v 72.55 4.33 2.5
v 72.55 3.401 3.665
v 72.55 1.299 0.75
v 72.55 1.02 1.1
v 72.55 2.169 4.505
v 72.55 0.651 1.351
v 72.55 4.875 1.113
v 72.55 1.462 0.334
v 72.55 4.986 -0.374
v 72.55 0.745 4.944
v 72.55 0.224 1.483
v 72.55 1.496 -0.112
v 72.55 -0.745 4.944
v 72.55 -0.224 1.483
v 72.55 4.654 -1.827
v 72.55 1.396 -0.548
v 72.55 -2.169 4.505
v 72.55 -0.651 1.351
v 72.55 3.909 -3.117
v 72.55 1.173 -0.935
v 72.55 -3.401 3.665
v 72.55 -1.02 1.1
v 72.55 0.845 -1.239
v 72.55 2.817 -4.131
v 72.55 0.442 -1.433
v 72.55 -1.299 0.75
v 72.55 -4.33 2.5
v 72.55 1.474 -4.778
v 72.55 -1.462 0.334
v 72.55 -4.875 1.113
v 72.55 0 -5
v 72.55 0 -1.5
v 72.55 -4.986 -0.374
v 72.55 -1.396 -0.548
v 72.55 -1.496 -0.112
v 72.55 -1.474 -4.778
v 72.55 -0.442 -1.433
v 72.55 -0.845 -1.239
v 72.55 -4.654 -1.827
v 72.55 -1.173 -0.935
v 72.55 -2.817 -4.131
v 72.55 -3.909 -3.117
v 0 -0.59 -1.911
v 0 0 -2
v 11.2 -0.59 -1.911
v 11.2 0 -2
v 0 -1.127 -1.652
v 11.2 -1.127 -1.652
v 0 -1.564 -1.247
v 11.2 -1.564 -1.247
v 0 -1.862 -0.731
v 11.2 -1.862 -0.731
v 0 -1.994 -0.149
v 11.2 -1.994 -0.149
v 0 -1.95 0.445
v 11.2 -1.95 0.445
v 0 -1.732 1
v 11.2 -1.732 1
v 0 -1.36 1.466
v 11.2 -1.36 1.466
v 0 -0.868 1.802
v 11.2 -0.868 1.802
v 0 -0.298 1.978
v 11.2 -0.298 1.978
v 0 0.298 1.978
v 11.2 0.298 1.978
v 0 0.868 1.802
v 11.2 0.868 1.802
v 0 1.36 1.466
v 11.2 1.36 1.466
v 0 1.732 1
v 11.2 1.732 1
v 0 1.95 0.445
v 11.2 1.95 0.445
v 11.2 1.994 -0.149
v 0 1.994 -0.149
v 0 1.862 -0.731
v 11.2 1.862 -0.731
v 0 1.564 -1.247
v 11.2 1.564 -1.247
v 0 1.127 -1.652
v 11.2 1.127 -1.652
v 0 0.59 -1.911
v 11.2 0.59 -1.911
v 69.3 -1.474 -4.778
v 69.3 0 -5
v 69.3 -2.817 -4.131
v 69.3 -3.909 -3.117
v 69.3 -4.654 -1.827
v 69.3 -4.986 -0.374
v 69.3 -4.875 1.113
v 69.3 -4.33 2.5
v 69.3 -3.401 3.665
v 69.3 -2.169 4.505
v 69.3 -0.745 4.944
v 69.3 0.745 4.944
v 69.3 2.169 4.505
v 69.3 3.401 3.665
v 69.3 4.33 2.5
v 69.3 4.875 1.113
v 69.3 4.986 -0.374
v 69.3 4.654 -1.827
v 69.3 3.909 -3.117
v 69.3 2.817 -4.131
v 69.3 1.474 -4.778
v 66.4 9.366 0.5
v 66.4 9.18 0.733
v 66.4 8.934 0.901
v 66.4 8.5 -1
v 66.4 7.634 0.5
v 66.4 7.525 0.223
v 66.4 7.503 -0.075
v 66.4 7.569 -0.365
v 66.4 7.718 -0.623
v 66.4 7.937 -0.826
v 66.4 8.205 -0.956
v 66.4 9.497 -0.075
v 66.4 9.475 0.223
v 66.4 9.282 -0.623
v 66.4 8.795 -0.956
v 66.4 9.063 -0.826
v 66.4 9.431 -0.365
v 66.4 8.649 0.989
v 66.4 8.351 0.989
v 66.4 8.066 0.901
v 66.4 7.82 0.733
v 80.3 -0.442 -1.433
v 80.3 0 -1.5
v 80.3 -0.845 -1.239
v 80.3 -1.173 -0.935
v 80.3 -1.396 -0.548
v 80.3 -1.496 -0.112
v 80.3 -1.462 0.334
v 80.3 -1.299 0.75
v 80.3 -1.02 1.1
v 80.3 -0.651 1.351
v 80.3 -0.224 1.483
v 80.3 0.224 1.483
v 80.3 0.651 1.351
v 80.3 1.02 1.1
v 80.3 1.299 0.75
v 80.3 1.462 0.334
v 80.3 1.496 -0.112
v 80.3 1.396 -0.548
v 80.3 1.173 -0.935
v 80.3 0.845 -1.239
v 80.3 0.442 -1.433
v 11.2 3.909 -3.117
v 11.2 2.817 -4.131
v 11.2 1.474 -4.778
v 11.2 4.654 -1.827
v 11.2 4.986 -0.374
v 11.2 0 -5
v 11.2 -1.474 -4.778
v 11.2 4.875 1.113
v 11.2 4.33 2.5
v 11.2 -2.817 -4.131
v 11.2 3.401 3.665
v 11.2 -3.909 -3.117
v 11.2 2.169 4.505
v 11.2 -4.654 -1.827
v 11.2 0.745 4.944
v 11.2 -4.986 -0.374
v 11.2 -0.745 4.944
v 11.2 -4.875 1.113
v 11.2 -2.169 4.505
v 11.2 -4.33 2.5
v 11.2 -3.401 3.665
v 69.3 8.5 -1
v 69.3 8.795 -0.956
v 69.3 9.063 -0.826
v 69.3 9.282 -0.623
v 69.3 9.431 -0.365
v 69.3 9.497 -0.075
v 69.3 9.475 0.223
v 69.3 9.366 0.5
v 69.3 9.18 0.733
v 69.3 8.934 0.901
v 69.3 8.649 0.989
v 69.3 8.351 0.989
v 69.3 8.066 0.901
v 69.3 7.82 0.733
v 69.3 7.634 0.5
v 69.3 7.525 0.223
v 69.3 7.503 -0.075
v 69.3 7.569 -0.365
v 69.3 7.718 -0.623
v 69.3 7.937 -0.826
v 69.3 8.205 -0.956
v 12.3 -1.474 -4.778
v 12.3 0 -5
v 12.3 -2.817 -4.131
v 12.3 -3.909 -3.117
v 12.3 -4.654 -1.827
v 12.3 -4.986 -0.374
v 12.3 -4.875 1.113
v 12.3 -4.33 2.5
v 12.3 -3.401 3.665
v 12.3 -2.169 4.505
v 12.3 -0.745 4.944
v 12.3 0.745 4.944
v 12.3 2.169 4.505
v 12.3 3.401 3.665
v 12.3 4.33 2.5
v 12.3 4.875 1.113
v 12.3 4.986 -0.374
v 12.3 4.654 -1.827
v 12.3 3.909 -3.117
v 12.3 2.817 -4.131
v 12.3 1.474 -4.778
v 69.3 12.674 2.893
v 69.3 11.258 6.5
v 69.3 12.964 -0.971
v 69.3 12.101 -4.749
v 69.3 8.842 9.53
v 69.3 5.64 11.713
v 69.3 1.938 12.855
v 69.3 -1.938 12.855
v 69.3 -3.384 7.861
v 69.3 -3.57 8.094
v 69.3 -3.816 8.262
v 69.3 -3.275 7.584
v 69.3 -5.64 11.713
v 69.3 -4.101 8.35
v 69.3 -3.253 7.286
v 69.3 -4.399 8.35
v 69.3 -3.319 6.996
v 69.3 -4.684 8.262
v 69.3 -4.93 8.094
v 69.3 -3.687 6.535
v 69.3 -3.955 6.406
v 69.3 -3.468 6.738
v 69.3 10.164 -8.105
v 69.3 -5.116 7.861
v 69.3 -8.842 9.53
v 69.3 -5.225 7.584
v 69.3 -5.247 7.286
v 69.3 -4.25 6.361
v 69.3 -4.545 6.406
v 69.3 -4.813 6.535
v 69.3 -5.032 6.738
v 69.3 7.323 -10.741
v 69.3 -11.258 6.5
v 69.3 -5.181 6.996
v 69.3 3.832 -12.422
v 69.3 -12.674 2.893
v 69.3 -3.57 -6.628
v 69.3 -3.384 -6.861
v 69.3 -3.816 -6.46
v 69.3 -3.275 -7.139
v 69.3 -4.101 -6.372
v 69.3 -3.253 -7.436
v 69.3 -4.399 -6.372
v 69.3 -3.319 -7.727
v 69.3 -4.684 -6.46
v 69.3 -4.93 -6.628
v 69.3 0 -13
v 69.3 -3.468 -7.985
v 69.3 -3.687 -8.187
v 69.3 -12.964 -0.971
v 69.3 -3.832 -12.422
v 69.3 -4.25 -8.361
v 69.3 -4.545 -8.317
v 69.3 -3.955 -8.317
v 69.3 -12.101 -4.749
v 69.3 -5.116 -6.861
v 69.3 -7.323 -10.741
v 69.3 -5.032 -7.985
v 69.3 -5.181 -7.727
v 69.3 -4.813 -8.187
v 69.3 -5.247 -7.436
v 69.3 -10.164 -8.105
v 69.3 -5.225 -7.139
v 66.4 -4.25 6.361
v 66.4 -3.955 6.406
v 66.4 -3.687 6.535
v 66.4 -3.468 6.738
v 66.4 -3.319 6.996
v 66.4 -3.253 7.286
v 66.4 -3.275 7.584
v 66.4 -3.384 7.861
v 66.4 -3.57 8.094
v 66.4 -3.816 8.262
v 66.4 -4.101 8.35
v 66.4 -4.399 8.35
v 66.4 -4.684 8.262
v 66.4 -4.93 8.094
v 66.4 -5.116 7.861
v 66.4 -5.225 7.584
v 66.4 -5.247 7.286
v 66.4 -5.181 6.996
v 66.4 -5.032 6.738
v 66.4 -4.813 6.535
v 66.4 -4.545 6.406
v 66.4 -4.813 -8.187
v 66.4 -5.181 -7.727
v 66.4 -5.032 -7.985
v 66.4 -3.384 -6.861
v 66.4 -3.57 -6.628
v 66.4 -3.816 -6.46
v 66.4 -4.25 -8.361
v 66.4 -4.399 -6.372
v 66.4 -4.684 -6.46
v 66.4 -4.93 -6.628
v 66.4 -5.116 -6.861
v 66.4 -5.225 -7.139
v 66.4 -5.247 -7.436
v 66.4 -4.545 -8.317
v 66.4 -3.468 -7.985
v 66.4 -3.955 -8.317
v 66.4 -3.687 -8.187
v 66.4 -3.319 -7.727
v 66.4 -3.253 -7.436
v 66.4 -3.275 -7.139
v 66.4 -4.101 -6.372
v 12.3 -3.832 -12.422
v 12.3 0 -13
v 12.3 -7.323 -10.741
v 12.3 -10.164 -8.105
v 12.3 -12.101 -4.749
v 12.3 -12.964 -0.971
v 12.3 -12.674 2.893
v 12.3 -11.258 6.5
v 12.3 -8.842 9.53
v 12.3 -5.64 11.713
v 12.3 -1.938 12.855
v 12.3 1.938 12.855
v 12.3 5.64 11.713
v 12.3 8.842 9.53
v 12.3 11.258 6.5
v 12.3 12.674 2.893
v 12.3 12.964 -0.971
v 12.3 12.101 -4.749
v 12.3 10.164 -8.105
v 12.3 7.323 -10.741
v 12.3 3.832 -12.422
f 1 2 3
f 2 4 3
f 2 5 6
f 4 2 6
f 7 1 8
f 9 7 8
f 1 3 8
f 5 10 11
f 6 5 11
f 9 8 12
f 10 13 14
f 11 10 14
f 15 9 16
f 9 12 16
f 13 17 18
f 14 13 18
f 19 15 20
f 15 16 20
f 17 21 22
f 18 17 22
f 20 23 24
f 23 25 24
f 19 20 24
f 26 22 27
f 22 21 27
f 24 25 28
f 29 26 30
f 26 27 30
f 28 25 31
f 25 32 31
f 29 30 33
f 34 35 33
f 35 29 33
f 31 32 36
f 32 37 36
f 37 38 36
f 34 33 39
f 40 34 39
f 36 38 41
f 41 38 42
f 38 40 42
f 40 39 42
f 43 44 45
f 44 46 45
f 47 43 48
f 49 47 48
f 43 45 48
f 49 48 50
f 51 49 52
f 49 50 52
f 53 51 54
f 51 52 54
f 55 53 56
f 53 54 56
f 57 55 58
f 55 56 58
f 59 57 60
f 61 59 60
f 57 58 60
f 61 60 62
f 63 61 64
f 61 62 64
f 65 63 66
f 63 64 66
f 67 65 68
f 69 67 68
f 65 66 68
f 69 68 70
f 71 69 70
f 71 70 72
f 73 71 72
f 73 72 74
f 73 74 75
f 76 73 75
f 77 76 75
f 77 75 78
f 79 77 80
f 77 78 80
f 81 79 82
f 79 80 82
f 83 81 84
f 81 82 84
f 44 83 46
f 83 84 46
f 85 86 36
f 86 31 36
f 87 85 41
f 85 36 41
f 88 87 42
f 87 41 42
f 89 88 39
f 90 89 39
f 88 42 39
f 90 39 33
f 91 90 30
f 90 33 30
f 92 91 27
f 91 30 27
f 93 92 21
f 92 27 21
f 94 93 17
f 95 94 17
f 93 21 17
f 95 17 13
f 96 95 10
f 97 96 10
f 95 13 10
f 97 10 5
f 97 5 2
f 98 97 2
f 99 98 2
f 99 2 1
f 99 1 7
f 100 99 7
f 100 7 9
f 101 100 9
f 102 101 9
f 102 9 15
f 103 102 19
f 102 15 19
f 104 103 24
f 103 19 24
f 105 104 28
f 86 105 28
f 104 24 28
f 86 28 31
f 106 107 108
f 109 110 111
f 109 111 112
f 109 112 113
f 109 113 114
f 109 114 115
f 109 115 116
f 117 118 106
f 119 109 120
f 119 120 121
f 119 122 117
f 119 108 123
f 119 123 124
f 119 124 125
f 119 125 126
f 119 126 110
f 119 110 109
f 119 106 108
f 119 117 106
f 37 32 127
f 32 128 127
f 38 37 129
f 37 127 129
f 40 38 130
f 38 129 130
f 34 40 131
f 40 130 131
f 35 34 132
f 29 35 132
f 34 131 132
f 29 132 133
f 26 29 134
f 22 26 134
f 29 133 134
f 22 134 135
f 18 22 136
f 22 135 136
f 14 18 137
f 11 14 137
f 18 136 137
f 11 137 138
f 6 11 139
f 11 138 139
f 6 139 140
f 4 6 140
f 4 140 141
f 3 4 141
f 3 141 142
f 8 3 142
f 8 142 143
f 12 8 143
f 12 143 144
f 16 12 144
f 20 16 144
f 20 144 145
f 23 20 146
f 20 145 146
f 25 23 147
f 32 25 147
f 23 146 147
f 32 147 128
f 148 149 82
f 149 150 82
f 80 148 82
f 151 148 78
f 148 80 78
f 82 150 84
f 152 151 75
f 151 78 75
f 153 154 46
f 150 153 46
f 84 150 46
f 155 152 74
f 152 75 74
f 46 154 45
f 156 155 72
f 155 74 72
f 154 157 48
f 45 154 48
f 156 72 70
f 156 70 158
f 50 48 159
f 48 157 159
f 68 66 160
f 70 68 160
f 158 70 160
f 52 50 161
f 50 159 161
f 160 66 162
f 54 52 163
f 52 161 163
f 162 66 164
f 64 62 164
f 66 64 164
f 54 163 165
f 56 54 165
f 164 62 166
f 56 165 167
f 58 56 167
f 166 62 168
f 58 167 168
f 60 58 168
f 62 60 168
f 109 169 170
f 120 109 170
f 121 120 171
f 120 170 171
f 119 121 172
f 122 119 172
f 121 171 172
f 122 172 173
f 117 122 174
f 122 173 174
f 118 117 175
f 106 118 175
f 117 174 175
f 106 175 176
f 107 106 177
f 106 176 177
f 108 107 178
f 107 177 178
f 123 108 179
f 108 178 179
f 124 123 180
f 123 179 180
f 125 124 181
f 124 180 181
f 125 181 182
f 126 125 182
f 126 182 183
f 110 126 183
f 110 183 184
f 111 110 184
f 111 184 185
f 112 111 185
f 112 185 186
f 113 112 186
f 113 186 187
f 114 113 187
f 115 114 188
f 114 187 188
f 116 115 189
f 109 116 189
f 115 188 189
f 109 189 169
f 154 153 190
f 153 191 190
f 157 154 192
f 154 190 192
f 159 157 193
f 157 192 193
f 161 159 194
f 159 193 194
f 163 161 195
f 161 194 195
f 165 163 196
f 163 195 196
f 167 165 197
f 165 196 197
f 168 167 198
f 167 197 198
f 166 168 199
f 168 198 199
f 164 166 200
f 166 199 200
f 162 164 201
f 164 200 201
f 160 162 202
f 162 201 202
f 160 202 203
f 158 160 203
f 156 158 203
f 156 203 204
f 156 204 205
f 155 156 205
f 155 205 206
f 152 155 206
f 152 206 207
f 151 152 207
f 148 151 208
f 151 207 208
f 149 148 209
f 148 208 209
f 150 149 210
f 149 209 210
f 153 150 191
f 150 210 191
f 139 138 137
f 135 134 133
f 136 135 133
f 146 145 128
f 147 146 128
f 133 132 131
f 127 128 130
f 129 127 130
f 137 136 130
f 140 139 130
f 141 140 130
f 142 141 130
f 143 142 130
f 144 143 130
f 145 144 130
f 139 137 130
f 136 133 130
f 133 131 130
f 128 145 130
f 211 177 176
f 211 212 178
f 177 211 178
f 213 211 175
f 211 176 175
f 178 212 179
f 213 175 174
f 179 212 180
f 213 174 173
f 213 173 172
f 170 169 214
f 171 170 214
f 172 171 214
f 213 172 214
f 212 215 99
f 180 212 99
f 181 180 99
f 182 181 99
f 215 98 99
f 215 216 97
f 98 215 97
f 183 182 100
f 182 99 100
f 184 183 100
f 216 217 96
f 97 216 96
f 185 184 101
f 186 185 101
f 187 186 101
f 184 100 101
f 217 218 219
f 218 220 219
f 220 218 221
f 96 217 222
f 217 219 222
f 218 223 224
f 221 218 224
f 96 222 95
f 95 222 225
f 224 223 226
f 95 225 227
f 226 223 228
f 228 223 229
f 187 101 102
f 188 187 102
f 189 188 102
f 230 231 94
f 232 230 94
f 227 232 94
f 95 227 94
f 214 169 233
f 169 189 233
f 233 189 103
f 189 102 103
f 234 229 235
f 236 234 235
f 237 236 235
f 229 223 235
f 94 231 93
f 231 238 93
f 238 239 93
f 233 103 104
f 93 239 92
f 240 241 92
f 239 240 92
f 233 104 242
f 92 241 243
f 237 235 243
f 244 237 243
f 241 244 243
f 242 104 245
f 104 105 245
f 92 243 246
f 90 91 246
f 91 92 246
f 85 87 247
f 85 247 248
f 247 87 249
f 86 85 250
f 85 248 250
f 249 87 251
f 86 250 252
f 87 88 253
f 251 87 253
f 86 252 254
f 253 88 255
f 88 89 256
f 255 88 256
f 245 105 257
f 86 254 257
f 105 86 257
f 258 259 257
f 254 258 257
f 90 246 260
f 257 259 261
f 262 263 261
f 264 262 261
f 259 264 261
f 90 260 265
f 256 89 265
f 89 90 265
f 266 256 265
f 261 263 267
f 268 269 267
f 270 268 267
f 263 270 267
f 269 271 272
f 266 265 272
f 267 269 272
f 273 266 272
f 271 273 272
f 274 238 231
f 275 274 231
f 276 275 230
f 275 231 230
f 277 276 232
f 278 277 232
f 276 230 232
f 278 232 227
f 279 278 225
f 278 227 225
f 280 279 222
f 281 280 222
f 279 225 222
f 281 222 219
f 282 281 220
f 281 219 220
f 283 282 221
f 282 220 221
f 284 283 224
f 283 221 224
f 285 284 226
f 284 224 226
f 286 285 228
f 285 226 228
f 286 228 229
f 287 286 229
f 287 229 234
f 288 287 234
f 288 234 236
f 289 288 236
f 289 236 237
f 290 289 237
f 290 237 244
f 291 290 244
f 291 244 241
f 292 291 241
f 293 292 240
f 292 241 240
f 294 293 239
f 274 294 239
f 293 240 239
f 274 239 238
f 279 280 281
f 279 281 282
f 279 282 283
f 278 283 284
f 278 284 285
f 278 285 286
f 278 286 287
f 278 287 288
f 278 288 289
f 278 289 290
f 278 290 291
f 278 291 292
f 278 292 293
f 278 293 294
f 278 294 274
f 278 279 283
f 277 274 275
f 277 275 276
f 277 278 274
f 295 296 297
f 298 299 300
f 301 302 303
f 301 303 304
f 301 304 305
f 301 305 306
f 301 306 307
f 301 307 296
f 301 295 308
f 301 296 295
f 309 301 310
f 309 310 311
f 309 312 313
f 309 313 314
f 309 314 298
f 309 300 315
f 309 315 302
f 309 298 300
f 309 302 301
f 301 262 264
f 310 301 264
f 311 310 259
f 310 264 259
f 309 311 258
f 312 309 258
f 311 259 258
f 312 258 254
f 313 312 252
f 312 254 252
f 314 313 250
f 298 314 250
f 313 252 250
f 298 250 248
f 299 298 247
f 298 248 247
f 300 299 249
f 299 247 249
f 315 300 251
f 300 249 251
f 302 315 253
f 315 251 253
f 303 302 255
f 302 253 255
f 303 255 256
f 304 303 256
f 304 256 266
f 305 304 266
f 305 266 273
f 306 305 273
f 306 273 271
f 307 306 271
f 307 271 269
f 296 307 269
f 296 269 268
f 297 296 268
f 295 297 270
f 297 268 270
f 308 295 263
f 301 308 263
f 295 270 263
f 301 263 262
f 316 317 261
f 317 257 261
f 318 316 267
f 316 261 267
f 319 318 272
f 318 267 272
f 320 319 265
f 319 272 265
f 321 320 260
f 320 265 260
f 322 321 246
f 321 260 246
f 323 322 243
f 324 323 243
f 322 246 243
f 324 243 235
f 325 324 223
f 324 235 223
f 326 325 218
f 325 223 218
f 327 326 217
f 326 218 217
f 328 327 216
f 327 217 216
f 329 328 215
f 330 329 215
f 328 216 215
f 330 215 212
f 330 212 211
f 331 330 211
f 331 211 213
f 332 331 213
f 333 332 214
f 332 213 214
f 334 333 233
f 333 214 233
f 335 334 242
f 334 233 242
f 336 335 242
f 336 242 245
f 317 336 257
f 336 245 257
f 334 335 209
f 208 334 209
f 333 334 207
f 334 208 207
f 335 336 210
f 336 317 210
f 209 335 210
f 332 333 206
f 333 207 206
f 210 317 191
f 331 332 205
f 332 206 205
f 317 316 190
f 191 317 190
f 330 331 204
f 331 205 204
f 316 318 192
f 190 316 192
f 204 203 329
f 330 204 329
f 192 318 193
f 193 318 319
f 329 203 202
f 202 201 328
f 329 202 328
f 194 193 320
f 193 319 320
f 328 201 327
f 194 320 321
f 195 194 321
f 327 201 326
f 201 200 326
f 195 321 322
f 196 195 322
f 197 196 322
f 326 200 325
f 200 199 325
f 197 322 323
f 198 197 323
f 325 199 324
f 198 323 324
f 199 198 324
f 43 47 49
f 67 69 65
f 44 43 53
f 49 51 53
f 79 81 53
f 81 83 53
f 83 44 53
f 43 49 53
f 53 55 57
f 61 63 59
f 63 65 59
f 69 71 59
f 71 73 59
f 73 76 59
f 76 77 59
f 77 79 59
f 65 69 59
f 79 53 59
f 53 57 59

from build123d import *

# Parameters (mm, degrees)
SZKIC2_R                   = 1
WYTNIJ_WYCI_GNI_CIE1_DEPTH = 2.9


with BuildPart() as part:
    # Szkic1 → Obrót1 (revolve)
    with BuildSketch(Plane.XY, mode=Mode.PRIVATE) as obr_t1_sk:
        Polygon((0, 0), (0, 2), (11.2, 2), (11.2, 5), (12.3, 5), (12.3, 13), (69.3, 13), (69.3, 5), (72.55, 5), (72.55, 1.5), (80.3, 1.5), (80.3, 0), align=None)
    revolve(obr_t1_sk.sketch.rotate(Axis((0, 0, 0), (-1, 0, 0)), 90), axis=Axis((0, 0, 0), (-1, 0, 0)))

    # Szkic2 → Wytnij-wyciągnięcie1 (cut)
    with BuildSketch(Plane(origin=(69.3, 0, 0), x_dir=(0, 0, -1), z_dir=(1, 0, 0))):
        with Locations((0, 8.5)):
            Circle(SZKIC2_R)
        with Locations((7.361215932, -4.25)):
            Circle(SZKIC2_R)
        with Locations((-7.361215932, -4.25)):
            Circle(SZKIC2_R)
    extrude(amount=-WYTNIJ_WYCI_GNI_CIE1_DEPTH, mode=Mode.SUBTRACT)


solid = part.part
